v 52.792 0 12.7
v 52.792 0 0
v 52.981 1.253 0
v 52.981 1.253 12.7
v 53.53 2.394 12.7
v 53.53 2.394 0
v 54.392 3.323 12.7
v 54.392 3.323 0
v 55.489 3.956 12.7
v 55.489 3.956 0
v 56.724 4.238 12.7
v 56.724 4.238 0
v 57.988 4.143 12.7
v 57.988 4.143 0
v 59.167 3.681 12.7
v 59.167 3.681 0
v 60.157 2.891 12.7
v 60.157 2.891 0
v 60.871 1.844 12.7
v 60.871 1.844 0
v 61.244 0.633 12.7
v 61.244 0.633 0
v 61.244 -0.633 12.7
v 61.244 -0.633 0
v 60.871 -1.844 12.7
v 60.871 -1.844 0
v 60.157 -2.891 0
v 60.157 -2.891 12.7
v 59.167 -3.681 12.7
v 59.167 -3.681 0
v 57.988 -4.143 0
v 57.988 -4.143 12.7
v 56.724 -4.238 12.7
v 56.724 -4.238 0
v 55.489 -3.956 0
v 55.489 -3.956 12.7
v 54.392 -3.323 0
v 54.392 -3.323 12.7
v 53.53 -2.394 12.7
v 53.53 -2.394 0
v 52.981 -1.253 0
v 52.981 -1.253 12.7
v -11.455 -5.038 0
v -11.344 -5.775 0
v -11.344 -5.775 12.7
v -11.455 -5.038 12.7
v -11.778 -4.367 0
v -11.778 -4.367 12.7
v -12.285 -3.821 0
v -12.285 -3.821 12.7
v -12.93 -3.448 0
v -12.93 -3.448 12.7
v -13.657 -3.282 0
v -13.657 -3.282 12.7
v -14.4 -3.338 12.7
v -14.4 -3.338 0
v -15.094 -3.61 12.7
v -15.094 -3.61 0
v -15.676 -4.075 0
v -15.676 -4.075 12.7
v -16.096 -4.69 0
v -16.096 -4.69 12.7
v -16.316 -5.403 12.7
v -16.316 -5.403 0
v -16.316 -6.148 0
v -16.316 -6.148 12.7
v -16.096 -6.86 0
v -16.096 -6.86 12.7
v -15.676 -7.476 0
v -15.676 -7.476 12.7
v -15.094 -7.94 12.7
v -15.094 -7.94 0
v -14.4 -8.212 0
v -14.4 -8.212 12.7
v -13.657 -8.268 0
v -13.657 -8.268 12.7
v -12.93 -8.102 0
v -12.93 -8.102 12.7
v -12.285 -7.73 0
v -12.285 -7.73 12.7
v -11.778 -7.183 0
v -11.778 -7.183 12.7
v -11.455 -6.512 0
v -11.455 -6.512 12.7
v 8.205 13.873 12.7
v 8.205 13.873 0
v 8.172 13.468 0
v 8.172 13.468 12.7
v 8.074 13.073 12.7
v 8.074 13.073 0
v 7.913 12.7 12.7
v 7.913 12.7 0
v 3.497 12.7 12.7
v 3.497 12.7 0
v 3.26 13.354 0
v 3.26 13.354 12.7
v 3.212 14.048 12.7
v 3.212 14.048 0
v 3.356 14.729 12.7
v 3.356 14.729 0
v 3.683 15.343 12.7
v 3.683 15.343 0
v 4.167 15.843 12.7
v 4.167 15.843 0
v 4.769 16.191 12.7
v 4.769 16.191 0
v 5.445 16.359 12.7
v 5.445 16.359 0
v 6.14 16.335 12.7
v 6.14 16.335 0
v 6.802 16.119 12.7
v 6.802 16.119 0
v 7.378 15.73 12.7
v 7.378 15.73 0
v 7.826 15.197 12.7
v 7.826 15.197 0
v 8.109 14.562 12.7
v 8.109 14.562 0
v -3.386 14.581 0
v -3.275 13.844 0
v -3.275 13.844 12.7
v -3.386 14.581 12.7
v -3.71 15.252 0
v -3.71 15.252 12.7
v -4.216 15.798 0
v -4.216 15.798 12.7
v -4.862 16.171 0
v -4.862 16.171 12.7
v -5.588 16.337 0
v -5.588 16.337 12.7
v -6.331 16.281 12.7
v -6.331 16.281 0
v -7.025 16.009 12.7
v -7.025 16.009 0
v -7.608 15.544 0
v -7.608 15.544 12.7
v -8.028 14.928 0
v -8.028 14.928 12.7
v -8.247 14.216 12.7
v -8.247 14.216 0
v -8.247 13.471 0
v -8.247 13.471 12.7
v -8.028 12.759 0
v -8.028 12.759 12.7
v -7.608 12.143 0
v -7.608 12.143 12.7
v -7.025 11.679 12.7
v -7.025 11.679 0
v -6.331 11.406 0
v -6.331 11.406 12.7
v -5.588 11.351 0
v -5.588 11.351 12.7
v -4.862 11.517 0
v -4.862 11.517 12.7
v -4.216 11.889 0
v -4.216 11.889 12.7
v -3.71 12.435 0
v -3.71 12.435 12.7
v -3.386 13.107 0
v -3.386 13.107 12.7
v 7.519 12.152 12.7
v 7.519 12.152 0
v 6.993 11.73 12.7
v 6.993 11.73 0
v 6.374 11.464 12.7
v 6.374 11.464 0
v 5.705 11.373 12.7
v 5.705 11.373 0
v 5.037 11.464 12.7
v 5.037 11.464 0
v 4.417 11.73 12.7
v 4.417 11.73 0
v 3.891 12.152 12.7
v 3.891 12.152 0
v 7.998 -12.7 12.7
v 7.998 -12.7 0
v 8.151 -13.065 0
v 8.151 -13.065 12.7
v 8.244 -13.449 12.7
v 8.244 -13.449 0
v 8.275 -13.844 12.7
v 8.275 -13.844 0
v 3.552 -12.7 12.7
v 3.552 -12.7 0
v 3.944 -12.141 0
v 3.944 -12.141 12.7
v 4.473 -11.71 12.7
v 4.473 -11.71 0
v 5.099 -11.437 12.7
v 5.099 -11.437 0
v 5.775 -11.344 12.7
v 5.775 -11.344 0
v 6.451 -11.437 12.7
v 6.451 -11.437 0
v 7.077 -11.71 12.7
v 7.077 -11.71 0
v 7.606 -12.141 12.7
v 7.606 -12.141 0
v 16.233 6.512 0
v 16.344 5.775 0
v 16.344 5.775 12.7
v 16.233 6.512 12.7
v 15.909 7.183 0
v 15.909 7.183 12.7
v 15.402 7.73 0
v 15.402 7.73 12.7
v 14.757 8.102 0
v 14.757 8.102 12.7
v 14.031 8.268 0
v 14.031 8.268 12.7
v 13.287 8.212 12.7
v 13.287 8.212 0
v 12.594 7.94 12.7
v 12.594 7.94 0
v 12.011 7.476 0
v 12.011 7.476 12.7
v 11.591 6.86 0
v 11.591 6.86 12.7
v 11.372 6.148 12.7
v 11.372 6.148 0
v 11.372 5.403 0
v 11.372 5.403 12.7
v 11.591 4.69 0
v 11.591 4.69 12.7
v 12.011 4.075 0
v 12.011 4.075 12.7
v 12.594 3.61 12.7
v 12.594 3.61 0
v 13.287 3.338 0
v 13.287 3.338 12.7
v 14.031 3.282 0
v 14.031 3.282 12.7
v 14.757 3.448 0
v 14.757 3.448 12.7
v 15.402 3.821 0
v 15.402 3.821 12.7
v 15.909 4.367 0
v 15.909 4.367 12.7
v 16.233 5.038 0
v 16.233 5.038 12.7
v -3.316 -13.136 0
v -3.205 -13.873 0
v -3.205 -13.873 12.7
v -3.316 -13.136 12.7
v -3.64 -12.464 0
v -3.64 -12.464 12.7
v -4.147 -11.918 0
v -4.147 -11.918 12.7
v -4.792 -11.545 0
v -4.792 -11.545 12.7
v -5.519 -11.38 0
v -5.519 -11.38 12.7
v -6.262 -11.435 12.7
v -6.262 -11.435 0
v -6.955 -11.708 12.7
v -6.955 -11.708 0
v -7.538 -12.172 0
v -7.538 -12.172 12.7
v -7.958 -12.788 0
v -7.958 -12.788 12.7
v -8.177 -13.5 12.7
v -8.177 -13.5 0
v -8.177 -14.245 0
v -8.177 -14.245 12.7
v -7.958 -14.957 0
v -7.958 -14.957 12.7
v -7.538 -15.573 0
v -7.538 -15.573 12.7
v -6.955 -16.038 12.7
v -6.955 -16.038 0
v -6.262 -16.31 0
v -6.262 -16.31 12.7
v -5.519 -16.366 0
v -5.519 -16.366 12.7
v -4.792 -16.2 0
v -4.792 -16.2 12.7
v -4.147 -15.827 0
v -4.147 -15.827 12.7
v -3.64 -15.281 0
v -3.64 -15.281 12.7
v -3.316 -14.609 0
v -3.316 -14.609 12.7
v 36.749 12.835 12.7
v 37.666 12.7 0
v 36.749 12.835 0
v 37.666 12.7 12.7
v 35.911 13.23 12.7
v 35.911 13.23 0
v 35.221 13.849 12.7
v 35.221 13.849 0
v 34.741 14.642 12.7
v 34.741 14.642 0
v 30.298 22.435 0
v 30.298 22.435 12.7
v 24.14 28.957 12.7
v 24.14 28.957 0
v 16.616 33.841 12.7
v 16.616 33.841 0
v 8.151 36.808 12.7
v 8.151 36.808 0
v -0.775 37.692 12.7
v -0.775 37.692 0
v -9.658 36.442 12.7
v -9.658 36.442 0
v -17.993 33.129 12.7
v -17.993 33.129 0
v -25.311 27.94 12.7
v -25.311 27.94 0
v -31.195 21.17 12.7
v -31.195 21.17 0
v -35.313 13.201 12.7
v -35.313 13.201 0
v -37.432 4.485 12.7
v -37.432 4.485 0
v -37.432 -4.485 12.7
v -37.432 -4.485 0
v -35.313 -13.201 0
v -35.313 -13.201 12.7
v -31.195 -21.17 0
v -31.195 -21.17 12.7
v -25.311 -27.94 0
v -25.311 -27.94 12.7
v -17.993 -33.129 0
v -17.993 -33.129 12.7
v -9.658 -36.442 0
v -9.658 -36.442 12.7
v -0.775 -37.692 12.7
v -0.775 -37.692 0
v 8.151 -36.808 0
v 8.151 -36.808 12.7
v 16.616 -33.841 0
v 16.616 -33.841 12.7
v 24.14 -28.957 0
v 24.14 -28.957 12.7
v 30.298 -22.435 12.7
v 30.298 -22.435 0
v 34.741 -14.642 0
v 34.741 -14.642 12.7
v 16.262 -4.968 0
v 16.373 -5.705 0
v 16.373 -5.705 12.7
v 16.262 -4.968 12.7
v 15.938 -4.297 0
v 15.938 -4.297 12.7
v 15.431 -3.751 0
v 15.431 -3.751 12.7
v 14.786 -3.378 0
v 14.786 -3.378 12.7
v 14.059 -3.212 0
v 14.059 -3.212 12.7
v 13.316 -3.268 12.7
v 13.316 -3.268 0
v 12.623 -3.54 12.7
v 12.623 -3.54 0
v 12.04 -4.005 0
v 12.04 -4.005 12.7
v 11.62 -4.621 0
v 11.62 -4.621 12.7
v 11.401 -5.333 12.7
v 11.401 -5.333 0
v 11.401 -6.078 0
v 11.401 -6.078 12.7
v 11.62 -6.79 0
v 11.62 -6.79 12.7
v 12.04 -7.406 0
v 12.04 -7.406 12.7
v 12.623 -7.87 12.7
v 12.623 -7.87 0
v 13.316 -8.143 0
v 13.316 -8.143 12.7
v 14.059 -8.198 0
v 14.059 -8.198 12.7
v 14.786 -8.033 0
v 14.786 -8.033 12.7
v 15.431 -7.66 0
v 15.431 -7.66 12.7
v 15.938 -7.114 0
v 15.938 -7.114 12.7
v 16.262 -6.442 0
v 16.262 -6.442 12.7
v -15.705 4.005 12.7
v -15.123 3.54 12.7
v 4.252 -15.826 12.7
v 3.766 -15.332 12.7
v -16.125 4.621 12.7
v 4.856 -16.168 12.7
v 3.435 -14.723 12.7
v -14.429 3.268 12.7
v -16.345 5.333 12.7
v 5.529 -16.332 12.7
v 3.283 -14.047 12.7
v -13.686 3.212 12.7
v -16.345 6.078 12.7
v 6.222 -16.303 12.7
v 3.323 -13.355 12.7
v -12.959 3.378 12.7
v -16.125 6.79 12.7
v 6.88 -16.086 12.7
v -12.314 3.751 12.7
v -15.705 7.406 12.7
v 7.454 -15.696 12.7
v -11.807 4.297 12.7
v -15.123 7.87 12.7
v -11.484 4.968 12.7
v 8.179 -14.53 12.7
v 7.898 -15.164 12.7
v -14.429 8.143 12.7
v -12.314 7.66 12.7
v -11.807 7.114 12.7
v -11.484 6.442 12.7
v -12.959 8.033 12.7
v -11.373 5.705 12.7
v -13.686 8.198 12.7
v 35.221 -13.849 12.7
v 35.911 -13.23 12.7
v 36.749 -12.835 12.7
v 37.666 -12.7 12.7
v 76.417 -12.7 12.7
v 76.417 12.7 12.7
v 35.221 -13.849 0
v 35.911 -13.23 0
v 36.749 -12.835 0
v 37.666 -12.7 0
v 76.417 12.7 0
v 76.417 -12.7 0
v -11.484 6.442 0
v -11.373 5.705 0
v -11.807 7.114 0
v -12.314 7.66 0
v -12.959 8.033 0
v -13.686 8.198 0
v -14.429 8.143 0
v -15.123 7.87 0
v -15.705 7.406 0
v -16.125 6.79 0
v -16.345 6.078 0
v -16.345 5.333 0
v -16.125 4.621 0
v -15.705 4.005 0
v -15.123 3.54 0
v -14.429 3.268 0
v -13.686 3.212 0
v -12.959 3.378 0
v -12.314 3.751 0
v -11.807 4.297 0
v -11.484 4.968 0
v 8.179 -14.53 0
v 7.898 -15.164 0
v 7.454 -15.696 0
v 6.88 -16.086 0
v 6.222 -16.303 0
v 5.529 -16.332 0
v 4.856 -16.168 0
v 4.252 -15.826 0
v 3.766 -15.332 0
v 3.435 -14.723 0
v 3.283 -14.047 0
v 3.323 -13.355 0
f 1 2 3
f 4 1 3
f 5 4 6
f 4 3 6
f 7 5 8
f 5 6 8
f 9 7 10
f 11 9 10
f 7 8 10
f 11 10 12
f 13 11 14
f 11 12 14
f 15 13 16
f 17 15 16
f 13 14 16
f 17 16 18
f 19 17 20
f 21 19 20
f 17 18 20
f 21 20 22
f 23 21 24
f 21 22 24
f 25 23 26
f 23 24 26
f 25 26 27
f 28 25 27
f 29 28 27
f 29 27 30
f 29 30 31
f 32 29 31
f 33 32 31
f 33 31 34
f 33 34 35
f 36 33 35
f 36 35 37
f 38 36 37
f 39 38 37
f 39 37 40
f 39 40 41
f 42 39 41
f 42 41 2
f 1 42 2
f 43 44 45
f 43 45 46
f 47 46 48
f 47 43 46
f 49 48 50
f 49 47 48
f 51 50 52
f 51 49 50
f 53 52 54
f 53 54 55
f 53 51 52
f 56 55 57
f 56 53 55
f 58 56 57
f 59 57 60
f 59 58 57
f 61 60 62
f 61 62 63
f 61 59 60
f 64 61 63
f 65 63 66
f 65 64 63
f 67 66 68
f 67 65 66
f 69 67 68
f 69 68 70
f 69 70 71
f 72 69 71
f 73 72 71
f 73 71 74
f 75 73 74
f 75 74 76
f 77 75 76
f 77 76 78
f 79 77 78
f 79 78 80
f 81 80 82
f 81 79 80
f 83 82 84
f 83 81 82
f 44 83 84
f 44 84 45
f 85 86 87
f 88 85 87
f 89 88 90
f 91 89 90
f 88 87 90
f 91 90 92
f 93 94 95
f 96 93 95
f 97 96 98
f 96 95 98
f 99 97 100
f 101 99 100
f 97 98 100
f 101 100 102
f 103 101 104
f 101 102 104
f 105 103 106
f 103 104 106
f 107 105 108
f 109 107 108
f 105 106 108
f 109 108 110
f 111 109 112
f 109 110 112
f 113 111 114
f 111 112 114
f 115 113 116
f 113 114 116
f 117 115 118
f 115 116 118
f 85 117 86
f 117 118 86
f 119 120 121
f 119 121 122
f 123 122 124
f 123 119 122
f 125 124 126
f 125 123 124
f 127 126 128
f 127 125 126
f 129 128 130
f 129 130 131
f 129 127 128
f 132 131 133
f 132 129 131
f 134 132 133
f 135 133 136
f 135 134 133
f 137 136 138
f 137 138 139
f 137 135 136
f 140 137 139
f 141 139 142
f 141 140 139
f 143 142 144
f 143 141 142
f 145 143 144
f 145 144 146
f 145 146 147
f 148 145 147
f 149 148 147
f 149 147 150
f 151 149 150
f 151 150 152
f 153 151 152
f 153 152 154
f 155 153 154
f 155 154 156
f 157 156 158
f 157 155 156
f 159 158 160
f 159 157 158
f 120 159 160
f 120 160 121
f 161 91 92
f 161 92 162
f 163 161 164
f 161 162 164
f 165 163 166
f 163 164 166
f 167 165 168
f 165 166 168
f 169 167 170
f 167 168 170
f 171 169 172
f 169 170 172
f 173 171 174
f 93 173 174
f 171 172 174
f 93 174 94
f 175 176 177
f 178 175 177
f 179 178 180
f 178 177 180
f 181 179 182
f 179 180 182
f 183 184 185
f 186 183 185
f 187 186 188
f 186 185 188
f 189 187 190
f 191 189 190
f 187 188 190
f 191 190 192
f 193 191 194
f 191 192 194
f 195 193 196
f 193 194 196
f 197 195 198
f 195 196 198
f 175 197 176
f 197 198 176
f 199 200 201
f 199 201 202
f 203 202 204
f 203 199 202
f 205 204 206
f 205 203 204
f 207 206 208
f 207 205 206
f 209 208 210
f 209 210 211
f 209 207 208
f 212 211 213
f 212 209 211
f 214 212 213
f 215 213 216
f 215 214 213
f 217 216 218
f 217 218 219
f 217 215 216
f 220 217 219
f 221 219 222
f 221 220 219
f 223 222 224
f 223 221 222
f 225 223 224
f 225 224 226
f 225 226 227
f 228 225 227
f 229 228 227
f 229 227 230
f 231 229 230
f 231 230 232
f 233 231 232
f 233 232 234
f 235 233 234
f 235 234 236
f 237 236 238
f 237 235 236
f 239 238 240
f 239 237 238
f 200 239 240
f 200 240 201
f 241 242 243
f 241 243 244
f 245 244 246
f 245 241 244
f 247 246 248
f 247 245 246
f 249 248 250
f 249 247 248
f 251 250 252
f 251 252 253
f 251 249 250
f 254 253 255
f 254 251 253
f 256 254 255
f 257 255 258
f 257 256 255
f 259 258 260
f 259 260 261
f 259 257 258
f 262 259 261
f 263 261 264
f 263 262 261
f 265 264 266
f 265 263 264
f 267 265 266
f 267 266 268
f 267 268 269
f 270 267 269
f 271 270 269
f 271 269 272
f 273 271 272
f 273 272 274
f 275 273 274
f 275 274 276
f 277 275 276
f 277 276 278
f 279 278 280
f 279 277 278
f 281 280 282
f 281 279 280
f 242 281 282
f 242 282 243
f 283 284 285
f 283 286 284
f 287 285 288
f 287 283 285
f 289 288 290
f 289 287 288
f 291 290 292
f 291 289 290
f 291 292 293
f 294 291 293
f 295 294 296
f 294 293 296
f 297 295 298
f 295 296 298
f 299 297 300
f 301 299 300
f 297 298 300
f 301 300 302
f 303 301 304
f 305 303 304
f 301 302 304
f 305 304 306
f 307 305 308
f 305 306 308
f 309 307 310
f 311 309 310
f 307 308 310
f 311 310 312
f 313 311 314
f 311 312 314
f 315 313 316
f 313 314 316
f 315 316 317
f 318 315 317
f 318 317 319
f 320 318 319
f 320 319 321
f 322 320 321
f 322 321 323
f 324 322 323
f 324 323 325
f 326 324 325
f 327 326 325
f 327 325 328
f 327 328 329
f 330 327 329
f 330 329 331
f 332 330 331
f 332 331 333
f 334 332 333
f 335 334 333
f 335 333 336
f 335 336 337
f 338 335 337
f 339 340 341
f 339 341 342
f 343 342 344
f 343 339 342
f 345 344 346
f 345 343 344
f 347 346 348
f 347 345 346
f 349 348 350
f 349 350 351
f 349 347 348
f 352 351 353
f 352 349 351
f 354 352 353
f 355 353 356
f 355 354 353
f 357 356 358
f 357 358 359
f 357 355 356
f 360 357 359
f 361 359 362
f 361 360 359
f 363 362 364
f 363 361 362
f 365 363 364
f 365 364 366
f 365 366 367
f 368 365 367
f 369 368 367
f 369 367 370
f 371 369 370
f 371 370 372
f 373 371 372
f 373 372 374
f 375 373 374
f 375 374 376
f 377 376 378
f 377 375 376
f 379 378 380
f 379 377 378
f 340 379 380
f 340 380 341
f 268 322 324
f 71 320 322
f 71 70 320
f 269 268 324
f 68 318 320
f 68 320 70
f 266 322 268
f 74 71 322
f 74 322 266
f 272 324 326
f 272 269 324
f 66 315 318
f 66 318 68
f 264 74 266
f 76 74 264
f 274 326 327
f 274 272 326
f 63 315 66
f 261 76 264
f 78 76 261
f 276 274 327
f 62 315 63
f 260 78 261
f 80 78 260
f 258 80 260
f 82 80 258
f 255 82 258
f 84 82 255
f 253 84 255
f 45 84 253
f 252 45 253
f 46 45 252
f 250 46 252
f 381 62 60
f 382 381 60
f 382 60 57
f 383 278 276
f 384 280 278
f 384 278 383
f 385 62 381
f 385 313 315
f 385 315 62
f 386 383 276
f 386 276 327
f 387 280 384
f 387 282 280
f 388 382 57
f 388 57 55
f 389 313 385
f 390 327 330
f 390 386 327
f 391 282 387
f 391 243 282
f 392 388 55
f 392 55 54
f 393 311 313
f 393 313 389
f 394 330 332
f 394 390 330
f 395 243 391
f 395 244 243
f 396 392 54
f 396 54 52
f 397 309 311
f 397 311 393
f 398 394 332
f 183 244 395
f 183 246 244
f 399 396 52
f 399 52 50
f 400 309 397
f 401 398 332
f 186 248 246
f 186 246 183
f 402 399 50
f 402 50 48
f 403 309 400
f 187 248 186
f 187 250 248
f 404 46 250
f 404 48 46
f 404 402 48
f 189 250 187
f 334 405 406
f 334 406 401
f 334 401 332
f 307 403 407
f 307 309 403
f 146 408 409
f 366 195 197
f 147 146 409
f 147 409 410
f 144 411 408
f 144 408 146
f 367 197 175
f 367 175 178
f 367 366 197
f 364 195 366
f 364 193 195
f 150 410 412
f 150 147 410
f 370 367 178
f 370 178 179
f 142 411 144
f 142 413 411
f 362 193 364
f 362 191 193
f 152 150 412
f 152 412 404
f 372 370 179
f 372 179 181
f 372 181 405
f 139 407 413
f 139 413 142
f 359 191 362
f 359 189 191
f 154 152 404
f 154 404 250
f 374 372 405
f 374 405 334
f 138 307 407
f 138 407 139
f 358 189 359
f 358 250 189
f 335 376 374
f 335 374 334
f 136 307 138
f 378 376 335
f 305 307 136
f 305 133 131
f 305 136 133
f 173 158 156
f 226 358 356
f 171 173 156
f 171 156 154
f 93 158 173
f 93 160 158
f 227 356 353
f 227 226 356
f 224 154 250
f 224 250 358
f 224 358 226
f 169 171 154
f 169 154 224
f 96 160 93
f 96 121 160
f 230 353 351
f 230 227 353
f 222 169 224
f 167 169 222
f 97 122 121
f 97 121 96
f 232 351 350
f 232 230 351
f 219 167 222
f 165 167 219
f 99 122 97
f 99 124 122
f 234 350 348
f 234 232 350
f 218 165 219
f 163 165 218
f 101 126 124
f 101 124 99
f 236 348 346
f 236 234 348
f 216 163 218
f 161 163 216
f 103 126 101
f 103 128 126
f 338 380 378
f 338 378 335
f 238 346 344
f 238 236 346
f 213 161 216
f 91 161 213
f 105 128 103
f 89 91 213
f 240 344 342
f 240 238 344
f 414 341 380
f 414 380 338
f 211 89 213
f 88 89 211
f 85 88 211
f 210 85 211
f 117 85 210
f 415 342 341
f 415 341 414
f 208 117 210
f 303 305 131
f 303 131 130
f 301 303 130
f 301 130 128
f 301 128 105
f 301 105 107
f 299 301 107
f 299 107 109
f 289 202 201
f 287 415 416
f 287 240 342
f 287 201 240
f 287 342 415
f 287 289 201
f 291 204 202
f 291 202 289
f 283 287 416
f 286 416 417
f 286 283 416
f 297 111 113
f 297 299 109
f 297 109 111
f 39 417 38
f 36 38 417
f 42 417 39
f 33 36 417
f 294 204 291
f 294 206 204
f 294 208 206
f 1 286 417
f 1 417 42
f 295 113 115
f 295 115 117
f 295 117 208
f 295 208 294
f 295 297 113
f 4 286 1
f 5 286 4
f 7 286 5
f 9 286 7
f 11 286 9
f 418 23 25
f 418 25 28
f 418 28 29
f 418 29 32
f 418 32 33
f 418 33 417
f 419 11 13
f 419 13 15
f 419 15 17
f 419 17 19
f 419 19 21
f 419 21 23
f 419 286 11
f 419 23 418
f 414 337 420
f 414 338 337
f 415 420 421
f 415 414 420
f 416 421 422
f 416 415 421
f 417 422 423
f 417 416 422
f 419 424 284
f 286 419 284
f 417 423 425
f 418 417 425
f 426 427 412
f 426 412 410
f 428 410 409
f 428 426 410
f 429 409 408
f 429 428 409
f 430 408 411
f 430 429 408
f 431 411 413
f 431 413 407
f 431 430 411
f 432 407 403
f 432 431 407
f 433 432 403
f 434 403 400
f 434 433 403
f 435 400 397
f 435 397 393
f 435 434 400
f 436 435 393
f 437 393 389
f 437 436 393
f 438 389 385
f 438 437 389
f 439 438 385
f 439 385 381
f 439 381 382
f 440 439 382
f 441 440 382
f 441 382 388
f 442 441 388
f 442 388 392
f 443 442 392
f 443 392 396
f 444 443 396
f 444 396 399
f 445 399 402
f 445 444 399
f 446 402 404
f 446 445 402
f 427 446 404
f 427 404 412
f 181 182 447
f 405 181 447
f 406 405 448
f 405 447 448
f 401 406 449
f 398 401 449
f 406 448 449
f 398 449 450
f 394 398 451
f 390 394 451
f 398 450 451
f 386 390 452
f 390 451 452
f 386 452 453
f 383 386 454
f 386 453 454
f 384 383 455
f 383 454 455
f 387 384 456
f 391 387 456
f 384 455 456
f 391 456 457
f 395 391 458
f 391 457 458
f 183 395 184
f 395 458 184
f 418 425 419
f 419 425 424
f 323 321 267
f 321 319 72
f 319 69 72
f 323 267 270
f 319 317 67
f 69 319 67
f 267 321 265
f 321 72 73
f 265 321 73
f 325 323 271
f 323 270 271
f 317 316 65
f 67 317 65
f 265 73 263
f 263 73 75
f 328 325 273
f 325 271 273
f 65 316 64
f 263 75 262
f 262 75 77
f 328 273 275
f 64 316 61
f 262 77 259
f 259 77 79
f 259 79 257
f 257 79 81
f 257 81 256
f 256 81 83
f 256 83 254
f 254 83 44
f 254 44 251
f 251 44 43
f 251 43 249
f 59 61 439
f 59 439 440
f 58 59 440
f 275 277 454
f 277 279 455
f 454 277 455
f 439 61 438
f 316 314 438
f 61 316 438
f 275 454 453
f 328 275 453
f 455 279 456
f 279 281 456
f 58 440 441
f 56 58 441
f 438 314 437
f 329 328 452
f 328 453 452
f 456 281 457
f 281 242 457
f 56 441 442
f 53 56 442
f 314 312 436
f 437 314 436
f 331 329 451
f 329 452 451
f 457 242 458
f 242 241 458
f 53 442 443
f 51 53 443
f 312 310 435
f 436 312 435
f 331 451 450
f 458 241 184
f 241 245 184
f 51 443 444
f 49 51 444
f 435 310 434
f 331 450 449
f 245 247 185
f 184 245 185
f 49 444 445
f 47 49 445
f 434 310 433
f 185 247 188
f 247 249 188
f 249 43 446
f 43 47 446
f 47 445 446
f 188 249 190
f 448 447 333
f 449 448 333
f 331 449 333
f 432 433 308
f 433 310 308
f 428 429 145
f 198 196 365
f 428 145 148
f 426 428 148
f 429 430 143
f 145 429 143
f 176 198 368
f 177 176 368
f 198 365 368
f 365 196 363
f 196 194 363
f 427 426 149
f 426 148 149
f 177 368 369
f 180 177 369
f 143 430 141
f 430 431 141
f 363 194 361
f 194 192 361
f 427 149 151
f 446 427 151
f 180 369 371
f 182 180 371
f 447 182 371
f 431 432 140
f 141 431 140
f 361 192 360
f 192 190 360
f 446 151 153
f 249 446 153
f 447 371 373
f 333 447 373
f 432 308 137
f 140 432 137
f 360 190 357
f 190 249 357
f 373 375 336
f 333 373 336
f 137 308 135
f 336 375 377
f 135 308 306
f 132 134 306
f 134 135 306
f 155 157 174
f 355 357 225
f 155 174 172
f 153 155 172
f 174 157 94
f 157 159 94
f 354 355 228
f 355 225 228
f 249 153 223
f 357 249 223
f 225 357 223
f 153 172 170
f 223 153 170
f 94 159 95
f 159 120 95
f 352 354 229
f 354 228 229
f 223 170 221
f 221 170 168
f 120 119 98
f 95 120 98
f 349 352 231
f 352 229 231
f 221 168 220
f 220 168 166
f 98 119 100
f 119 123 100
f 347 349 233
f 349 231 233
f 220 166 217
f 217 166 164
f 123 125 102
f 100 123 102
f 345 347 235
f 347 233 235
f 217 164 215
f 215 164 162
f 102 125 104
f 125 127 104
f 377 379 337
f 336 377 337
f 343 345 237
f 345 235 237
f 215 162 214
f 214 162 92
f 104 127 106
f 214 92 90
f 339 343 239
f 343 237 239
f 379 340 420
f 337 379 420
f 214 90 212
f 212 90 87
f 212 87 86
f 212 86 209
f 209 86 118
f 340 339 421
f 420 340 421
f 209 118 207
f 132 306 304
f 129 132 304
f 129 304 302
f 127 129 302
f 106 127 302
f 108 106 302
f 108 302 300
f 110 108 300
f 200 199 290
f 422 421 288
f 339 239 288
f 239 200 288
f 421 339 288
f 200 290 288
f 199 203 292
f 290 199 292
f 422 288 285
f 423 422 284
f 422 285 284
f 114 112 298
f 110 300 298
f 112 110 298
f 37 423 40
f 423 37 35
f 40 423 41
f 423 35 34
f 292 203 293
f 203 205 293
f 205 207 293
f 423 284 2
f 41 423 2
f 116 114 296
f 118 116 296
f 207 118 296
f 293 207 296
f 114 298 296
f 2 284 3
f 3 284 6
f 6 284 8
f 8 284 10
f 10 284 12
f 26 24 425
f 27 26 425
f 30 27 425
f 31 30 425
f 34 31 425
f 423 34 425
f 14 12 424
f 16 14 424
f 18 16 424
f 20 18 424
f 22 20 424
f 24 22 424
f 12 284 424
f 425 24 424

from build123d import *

# Parameters (mm, degrees)
SKETCH1_R                        = 2.5
BOSS_EXTRUDE1_DEPTH              = 12.7
FILLET1_R                        = 3.175
TAP_DRILL_FOR_M10X1_5_TAP1_D     = 8.5
TAP_DRILL_FOR_M10X1_5_TAP1_DEPTH = 20
TAP_DRILL_FOR_M10X1_5_TAP1_TIP   = 2.553657631


with BuildPart() as part:
    # Sketch1 → Boss-Extrude1 (new body)
    with BuildSketch(Plane.XY):
        with BuildLine():
            ThreePointArc((25, 0), (24.117920391, -6.582242475), (21.53392672, -12.7))
            Line((21.53392672, -12.7), (35.496478699, -12.7))
            ThreePointArc((35.496478699, -12.7), (37.145034977, -6.444872111), (37.7, 0))
            ThreePointArc((37.7, 0), (37.145034977, 6.444872111), (35.496478699, 12.7))
            Line((35.496478699, 12.7), (21.53392672, 12.7))
            ThreePointArc((21.53392672, 12.7), (24.117920391, 6.582242475), (25, 0))
        make_face()
        with BuildLine():
            Line((35.496478699, -12.7), (21.53392672, -12.7))
            ThreePointArc((21.53392672, -12.7), (-25, 0), (21.53392672, 12.7))
            Line((21.53392672, 12.7), (35.496478699, 12.7))
            ThreePointArc((35.496478699, 12.7), (-37.7, 0), (35.496478699, -12.7))
        make_face()
        with BuildLine():
            ThreePointArc((37.7, 0), (37.145034977, -6.444872111), (35.496478699, -12.7))
            Line((35.496478699, -12.7), (76.417300015, -12.7))
            Line((76.417300015, -12.7), (76.417300015, 12.7))
            Line((76.417300015, 12.7), (35.496478699, 12.7))
            ThreePointArc((35.496478699, 12.7), (37.145034977, 6.444872111), (37.7, 0))
        make_face()
        with BuildLine():
            Line((-1.017300015, 12.7), (-1.017300015, -12.7))
            Line((-1.017300015, -12.7), (3.552069768, -12.7))
            ThreePointArc((3.552069768, -12.7), (5.775120383, -11.34369837), (7.998170999, -12.7))
            Line((7.998170999, -12.7), (21.53392672, -12.7))
            ThreePointArc((21.53392672, -12.7), (24.117920391, -6.582242475), (25, 0))
            ThreePointArc((25, 0), (24.117920391, 6.582242475), (21.53392672, 12.7))
            Line((21.53392672, 12.7), (7.913288635, 12.7))
            ThreePointArc((7.913288635, 12.7), (5.705346209, 11.372599779), (3.497403783, 12.7))
            Line((3.497403783, 12.7), (-1.017300015, 12.7))
        make_face()
        with Locations((13.872599779, -5.705346209)):
            Circle(SKETCH1_R, mode=Mode.SUBTRACT)
        with Locations((13.84369837, 5.775120383)):
            Circle(SKETCH1_R, mode=Mode.SUBTRACT)
        with BuildLine():
            Line((3.552069768, -12.7), (-1.017300015, -12.7))
            Line((-1.017300015, -12.7), (-1.017300015, 12.7))
            Line((-1.017300015, 12.7), (3.497403783, 12.7))
            ThreePointArc((3.497403783, 12.7), (5.101134353, 16.29848684), (8.205346209, 13.872599779))
            ThreePointArc((8.205346209, 13.872599779), (8.13123327, 13.268387923), (7.913288635, 12.7))
            Line((7.913288635, 12.7), (21.53392672, 12.7))
            ThreePointArc((21.53392672, 12.7), (-25, 0), (21.53392672, -12.7))
            Line((21.53392672, -12.7), (7.998170999, -12.7))
            ThreePointArc((7.998170999, -12.7), (8.204896766, -13.255322019), (8.275120383, -13.84369837))
            ThreePointArc((8.275120383, -13.84369837), (5.186744032, -16.273474753), (3.552069768, -12.7))
        make_face()
        with Locations((-13.84369837, -5.775120383)):
            Circle(SKETCH1_R, mode=Mode.SUBTRACT)
        with Locations((-5.705346209, -13.872599779)):
            Circle(SKETCH1_R, mode=Mode.SUBTRACT)
        with Locations((-13.872599779, 5.705346209)):
            Circle(SKETCH1_R, mode=Mode.SUBTRACT)
        with Locations((-5.775120383, 13.84369837)):
            Circle(SKETCH1_R, mode=Mode.SUBTRACT)
    extrude(amount=BOSS_EXTRUDE1_DEPTH)

    # Fillet1
    fillet1_edges = [part.edges().sort_by_distance(p)[0] for p in [
        (35.496478699, 12.7, 6.35),
        (35.496478699, -12.7, 6.35),
    ]]
    fillet(fillet1_edges, radius=FILLET1_R)

    # Tap Drill for M10x1.5 Tap1
    with Locations(Plane.XY.offset(12.7)):
        with Locations((57.041798974, 0)):
            Hole(TAP_DRILL_FOR_M10X1_5_TAP1_D / 2, depth=TAP_DRILL_FOR_M10X1_5_TAP1_DEPTH)
            with Locations((0, 0, -(TAP_DRILL_FOR_M10X1_5_TAP1_DEPTH + TAP_DRILL_FOR_M10X1_5_TAP1_TIP / 2))):  # 118° drill point
                Cone(0, TAP_DRILL_FOR_M10X1_5_TAP1_D / 2, TAP_DRILL_FOR_M10X1_5_TAP1_TIP, mode=Mode.SUBTRACT)


solid = part.part
